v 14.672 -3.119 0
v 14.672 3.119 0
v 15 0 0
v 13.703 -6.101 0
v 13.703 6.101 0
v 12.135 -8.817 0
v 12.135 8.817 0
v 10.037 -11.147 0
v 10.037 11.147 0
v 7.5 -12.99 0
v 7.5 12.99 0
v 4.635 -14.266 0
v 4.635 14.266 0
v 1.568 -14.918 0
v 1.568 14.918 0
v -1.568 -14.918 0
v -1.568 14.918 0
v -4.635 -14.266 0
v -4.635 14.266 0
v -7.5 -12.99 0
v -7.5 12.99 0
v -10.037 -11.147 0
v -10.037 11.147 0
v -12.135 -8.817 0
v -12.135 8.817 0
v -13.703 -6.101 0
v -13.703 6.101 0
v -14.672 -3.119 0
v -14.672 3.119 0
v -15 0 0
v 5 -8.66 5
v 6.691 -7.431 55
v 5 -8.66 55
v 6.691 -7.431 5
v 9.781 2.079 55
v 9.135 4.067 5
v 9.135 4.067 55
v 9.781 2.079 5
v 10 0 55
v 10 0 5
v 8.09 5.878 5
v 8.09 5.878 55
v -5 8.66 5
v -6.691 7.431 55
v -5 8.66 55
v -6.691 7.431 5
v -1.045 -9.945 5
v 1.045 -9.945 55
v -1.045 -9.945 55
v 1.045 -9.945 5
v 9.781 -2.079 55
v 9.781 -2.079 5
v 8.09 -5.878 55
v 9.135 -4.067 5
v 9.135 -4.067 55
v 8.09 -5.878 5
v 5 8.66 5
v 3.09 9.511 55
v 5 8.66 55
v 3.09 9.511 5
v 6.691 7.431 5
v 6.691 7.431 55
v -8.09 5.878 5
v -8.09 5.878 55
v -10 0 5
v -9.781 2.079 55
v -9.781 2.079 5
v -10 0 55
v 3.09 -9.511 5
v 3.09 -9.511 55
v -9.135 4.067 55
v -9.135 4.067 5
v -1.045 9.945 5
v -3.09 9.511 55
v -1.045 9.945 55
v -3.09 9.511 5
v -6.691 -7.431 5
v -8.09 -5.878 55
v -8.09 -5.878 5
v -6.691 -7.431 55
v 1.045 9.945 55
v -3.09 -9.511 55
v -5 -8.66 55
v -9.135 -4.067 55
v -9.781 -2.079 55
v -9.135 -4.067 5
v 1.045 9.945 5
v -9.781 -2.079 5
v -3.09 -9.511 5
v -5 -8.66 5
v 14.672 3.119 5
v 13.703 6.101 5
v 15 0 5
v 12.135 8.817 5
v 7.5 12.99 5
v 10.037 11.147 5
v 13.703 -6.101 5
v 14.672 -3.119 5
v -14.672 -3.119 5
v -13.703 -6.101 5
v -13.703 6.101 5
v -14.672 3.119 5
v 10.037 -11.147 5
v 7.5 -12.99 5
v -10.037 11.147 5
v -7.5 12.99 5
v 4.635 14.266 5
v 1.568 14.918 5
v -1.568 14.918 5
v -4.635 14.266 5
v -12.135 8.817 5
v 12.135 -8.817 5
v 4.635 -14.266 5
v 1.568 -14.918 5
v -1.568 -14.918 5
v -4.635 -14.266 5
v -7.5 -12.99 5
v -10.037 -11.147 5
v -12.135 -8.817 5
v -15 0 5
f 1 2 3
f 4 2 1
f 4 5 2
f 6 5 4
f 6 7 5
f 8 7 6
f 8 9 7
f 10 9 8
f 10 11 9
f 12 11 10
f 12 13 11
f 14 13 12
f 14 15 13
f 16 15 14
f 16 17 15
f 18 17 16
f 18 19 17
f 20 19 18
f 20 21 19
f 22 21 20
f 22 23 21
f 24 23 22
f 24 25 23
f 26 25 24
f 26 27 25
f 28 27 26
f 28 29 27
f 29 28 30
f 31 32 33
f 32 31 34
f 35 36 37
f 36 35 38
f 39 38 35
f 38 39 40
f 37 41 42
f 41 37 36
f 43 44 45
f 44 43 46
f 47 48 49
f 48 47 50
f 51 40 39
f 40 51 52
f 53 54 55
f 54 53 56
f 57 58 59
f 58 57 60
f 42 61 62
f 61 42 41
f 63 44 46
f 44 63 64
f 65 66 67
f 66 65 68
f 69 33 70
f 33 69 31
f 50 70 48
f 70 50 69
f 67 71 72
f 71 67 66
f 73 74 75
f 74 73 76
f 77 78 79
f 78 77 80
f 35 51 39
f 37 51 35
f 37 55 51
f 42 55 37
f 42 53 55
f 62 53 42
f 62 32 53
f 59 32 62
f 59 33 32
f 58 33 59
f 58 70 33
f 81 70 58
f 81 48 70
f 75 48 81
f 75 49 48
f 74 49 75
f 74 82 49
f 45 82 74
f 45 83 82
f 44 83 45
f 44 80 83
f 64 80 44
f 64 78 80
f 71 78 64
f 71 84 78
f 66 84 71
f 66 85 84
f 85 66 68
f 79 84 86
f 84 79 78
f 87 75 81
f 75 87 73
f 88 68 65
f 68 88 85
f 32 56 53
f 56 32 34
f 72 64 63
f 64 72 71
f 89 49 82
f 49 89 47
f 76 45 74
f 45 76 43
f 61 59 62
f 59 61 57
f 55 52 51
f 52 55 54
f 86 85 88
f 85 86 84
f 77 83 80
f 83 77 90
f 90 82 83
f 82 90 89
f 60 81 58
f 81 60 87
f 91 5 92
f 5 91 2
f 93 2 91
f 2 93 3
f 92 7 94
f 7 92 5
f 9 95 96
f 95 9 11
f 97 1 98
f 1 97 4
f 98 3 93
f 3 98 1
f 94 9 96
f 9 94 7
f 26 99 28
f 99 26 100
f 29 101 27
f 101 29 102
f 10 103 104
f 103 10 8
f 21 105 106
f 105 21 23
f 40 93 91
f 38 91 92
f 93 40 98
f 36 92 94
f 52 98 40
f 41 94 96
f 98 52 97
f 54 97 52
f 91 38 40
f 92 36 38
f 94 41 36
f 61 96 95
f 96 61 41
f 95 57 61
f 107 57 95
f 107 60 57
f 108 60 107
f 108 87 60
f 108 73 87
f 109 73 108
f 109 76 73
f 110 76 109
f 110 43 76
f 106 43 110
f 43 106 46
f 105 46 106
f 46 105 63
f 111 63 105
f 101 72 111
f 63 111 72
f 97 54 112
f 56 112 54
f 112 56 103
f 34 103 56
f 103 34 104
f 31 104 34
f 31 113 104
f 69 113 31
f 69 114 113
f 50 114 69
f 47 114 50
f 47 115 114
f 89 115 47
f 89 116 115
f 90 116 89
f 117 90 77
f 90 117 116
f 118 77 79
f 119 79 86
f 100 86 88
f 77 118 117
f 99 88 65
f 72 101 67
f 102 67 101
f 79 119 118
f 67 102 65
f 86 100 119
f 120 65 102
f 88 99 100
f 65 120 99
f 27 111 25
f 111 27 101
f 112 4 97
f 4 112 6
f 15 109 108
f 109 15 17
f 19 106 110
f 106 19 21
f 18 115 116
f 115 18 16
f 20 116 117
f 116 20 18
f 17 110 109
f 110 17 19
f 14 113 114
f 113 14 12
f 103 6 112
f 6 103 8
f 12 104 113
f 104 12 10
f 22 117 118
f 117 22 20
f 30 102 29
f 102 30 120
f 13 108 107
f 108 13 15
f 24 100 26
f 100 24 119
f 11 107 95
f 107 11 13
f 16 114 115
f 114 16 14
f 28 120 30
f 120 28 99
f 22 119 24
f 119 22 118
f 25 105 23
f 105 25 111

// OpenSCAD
module colonne() {

cylinder(r=1, h=4);
translate(0, 0, 0)
cylinder(r=10, h=55);
translate(0, 5, 0)
cylinder(r=15, h=5);
};

colonne();
